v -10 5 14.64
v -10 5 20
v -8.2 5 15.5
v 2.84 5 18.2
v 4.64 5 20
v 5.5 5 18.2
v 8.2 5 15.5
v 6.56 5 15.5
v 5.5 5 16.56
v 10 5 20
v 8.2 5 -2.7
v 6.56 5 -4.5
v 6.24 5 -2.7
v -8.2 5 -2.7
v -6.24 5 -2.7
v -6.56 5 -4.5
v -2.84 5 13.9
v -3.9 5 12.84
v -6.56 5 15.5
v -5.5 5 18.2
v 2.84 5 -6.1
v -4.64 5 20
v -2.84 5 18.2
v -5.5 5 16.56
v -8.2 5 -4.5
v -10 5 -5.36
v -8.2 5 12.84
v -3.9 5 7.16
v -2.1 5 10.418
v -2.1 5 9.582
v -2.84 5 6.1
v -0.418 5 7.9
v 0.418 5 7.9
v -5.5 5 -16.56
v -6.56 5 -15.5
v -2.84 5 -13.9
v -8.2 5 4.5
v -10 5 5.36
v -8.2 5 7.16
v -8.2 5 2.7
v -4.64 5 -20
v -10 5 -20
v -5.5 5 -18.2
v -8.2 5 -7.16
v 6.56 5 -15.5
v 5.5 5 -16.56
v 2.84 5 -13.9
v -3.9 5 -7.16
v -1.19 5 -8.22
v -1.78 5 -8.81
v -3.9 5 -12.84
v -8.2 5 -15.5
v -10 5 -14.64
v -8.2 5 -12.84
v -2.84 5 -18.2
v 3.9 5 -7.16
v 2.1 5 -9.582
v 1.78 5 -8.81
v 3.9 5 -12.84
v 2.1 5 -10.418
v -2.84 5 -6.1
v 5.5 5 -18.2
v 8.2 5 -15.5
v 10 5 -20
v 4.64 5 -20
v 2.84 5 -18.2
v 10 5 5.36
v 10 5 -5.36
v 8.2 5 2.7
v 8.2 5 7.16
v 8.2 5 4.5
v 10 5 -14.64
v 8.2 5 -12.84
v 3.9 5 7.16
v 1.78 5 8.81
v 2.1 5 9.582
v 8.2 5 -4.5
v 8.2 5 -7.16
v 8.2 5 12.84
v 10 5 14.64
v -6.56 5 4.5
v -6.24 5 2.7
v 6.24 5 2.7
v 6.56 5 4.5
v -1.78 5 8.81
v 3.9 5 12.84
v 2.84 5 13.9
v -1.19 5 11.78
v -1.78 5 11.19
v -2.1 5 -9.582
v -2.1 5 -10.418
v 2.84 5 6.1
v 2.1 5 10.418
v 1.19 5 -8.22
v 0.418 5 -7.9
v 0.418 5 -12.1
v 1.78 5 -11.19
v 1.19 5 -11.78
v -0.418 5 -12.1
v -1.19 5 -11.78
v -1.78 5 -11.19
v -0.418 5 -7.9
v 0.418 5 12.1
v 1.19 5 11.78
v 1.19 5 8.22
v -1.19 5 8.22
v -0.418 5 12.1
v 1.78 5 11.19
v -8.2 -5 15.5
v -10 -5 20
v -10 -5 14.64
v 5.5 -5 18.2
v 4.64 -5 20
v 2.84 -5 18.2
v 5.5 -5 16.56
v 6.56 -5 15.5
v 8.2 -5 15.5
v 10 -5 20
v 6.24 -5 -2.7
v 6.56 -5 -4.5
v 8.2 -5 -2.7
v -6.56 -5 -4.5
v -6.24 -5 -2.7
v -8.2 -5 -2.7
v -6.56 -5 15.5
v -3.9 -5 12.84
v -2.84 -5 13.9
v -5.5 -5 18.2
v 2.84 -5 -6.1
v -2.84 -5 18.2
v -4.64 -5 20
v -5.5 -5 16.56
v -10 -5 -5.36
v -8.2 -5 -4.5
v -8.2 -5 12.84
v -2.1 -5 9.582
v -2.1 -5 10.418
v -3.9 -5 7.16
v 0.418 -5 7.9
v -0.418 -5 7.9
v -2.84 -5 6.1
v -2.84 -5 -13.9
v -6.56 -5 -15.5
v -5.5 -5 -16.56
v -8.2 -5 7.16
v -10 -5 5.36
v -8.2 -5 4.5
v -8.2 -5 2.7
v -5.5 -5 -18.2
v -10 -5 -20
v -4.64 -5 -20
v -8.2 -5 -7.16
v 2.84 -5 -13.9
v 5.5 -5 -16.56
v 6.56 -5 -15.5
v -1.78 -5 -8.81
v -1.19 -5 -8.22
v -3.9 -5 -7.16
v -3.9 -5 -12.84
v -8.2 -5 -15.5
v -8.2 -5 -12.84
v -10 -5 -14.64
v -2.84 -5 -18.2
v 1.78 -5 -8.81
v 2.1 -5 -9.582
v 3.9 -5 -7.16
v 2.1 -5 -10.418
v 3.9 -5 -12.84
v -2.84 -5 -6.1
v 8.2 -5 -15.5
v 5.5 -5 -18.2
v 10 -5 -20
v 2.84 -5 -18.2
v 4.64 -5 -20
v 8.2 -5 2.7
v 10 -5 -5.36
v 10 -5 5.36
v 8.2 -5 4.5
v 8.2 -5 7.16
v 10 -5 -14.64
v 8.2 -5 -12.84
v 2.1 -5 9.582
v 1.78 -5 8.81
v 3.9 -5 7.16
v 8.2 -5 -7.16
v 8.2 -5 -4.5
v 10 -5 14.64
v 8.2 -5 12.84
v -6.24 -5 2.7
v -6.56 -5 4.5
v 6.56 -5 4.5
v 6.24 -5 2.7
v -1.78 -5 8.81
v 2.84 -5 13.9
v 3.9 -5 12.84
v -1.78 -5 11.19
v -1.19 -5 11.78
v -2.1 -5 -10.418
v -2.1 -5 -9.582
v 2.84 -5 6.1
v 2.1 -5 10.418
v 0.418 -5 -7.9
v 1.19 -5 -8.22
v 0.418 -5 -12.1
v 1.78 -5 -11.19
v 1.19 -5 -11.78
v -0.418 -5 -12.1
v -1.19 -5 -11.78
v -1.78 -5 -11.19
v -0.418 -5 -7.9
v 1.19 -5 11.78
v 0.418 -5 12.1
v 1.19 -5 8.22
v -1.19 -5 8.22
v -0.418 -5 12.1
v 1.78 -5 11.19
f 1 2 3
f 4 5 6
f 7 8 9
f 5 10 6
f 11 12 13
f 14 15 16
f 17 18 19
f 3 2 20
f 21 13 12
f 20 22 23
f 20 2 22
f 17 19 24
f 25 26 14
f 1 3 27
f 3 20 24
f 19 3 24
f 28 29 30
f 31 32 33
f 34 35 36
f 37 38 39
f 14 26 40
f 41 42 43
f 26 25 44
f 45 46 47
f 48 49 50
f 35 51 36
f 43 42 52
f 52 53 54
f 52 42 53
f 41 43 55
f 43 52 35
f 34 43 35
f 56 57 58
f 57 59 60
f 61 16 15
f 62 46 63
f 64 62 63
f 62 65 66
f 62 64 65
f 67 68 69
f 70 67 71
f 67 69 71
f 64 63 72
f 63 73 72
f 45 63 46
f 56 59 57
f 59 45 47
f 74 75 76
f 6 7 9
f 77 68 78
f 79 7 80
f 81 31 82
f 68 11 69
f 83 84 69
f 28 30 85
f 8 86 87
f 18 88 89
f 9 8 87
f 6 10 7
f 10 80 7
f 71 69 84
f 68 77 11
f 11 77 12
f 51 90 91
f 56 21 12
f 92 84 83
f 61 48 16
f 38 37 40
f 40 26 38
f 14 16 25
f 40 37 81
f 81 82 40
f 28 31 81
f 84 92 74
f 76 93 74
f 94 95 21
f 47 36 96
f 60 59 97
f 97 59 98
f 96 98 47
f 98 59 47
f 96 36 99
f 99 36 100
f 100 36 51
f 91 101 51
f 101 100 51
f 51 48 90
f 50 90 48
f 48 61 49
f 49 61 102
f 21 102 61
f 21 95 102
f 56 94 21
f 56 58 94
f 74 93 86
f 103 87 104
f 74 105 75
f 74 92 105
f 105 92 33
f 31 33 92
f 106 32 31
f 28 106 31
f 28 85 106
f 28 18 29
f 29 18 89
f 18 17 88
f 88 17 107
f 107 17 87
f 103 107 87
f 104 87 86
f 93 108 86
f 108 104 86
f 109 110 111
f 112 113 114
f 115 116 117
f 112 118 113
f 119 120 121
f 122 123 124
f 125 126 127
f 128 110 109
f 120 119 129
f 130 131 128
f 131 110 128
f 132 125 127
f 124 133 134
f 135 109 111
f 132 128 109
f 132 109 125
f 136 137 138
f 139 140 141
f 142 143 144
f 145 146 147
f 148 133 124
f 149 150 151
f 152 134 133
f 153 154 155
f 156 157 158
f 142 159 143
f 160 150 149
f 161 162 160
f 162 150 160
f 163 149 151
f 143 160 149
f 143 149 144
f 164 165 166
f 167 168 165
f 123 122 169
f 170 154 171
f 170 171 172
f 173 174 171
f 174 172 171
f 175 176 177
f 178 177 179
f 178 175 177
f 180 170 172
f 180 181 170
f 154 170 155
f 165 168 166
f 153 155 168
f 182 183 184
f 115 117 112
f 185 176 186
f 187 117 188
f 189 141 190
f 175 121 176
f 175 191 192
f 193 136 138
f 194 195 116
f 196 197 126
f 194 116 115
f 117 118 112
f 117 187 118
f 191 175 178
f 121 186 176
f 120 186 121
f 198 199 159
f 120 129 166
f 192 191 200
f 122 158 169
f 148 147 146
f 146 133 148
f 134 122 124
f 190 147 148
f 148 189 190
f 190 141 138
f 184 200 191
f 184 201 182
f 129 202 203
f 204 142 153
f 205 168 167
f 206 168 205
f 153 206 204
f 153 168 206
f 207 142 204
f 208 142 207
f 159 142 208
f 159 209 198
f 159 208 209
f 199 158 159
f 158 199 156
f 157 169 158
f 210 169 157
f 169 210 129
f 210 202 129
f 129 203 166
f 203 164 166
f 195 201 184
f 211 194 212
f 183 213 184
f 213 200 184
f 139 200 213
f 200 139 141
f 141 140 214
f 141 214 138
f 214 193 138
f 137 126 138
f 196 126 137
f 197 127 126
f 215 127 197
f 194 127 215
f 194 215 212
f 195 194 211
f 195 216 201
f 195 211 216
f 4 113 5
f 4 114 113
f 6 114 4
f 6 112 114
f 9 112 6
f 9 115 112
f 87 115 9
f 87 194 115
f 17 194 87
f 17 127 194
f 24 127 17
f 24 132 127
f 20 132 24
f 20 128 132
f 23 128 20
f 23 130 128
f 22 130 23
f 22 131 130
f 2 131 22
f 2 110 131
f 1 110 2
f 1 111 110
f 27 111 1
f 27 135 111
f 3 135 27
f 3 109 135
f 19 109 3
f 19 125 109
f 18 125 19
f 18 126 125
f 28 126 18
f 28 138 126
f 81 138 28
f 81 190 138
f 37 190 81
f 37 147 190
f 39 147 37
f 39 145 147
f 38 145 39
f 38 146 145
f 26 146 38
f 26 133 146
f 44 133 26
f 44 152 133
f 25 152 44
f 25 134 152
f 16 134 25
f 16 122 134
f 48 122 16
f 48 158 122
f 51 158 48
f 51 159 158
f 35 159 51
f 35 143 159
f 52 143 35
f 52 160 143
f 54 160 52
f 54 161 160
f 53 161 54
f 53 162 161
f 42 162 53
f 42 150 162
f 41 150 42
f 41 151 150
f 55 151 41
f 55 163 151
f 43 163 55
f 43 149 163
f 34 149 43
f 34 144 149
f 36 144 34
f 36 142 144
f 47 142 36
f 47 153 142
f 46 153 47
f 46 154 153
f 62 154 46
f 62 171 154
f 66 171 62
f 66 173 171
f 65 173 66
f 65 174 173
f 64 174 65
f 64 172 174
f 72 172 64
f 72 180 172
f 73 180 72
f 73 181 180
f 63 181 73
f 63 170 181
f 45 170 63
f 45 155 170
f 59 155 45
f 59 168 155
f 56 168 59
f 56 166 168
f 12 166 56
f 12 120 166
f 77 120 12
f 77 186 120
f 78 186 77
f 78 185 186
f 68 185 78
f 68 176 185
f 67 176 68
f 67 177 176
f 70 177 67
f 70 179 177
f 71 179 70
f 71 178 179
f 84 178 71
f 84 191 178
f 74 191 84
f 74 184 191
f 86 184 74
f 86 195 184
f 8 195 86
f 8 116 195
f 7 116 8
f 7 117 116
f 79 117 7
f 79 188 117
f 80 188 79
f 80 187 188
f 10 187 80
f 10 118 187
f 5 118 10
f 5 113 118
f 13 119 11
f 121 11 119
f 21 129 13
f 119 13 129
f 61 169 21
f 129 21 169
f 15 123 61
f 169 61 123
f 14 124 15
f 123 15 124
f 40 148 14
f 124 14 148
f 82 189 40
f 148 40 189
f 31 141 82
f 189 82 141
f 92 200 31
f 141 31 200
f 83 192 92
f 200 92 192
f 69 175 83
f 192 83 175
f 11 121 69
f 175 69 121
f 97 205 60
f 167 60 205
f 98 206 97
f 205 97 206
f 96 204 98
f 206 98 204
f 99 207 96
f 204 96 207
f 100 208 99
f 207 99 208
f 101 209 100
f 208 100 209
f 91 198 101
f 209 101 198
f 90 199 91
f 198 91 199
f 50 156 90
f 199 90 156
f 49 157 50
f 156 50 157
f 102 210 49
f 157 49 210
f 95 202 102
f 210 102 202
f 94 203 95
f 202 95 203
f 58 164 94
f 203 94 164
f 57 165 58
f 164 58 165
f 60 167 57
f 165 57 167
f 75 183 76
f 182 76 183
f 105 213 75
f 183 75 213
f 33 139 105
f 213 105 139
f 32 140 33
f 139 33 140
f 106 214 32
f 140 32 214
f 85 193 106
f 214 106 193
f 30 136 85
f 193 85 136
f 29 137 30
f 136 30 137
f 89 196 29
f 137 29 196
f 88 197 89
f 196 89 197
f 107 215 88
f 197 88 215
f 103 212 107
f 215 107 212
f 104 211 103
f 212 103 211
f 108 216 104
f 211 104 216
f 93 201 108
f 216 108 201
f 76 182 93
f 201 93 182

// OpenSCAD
// file: util.scad
function accurate_diam(diam,sides) = 1 / cos(180/sides) / 2 * diam;

module hole(diam,len,sides=8) {
  rotate([0,0,180/sides]) {
    cylinder(r=accurate_diam(diam,sides),h=len,center=true,$fn=sides);
  }
}

module accurate_circle(diam,sides=8) {
  rotate([0,0,180/sides]) {
    circle(r=accurate_diam(diam,sides),$fn=sides);
  }
}

module debug_axes() {
  color("red") {
    translate([50,0,0]) cube([100,.2,.2],center=true);
    translate([0,50,0]) cube([.2,100,.2],center=true);
    translate([0,0,50]) cube([.2,.2,100],center=true);
  }
}

module ring(id,thickness,height,fn=16) {
  od = id + thickness;
  linear_extrude(height=height,center=true) {
    difference() {
      accurate_circle(od,fn);
      accurate_circle(id,fn);
    }
  }
}

module rounded_square(width,depth,diam,fn=resolution) {
  pos_x = width/2-diam/2;
  pos_y = depth/2-diam/2;

  hull() {
    for(x=[left,right]) {
      for(y=[front,rear]) {
        translate([x*pos_x,y*pos_y,0]) {
          accurate_circle(diam,fn);
        }
      }
    }
  }
}

module rounded_cube(width,depth,height,diam,fn=resolution) {
  linear_extrude(height=height,center=true,convexity=3) {
    rounded_square(width,depth,diam,fn);
  }
}
// main file
include <main.scad>;

module filament_pulley(circumference=16*2, base_height=6, wraps=5,hole_od=0,od_height=0) {
  diam           = circumference/pi;
  height         = wraps*groove_height+2*(wraps+1)*groove_depth;
  base_diam      = diam+groove_depth*2;
  steps_per_mm   = steps_per_turn/circumference;
  echo("CIRCUMF:   ", steps_per_mm);
  echo("STEPS/MM:  ", steps_per_mm);
  echo("DIAM:      ", diam);
  echo("BASE_DIAM: ", base_diam);
  echo("HEIGHT:    ", height+base_height-groove_depth);

  base_pos_z     = height+base_height/2-groove_depth;
  bottom_pos_z   = 0;
  top_pos_z      = (base_height > 0) ? base_pos_z + base_height/2 : height;

  module profile() {
    difference() {
      union() {
        translate([diam/4,height/2,0]) {
          square([diam/2,height],center=true);
        }

        translate([base_diam/4,base_pos_z,0]) {
          square([base_diam/2,base_height],center=true);
        }

        for (z=[0:wraps]) {
          translate([diam/2,groove_depth+z*(groove_height+groove_depth*2)]) {
            hull() {
              translate([-0.5,0,0]) {
                square([1,groove_depth*2],center=true);
              }
              translate([0,0,0]) {
                square([groove_depth*2,0.005],center=true);
              }
            }
          }
        }
      }
    }
  }

  translate([0,0,height+1]) {
    % difference() {
      profile();
      hole_profile();
    }
  }

  module body() {
    rotate_extrude(convexity=10,$fn=resolution) {
      profile();
    }

    translate([diam/2+1,0,groove_depth*2+groove_height/2]) {
      % cube([1,1,groove_height],center=true);
    }
  }

  module hole_profile() {
    hole_id_diff = 1;
    hole_id = hole_od - hole_id_diff*1.75;

    for (z=[top_pos_z,bottom_pos_z]) {
      translate([0,z]) {
        hull() {
          translate([hole_od/4,0]) {
            square([hole_od/2,od_height*2],center=true);
          }
          translate([hole_id/4,0]) {
            square([hole_id/2,(od_height+hole_id_diff)*2],center=true);
          }
        }
      }
    }

    translate([hole_id/4,0,0]) {
      square([hole_id/2,2*(height+base_height)],center=true);
    }
  }

  module holes() {
    // for driver
    nut_thickness = 2.70;
    nut_diam      = 5.55;
    screw_diam    = 3.15;
    shaft_diam    = 5.1;
    d_cut_depth   = shaft_diam-4.6;
    d_cut_height  = base_height+3;
    d_cut_height  = 100;

    // idler branch
    if (hole_od) {
      rotate_extrude(convexity=10,$fn=12) {
        hole_profile();
      }

      for(z=[top_pos_z+0.1,bottom_pos_z-0.1]) {
        translate([0,0,z]) {
          % hole(hole_od,0.05,resolution);
        }
      }
    }

    // driver
    if (base_height) {
      difference() {
        hole(shaft_diam,50,12);

        translate([shaft_diam/2,0,0]) {
          cube([d_cut_depth*2,shaft_diam+1,d_cut_height*2],center=true);
        }
      }
      translate([shaft_diam/2-d_cut_depth-0.1+nut_thickness/2,0,top_pos_z-nut_diam/2]) {
        rotate([0,90,0]) {
          rotate([0,0,90]) {
            hole(nut_diam,nut_thickness,6);
          }
          translate([0,0,10]) {
            hole(screw_diam,20,16);
          }
        }
        translate([0,0,nut_diam/2]) {
          cube([nut_thickness,nut_diam,nut_diam],center=true);
        }
      }
    }
  }

  difference() {
    body();
    holes();
  }
}

module driver_pulley() {
  base_height   = 6;

  filament_pulley(idler_circumference,base_height,driver_wraps);
}

module idler_pulley() {
  // 625
  bearing_od     = 16;
  bearing_height = 5;

  // MR105 or 623
  bearing_od     = 10.2;
  bearing_height = 4;

  filament_pulley(idler_circumference,0,idler_wraps,bearing_od,bearing_height);
}

rotate([90,0,0]) {
  rotate([0,0,90]) {
    extrusion_2040(10);
  }
}
